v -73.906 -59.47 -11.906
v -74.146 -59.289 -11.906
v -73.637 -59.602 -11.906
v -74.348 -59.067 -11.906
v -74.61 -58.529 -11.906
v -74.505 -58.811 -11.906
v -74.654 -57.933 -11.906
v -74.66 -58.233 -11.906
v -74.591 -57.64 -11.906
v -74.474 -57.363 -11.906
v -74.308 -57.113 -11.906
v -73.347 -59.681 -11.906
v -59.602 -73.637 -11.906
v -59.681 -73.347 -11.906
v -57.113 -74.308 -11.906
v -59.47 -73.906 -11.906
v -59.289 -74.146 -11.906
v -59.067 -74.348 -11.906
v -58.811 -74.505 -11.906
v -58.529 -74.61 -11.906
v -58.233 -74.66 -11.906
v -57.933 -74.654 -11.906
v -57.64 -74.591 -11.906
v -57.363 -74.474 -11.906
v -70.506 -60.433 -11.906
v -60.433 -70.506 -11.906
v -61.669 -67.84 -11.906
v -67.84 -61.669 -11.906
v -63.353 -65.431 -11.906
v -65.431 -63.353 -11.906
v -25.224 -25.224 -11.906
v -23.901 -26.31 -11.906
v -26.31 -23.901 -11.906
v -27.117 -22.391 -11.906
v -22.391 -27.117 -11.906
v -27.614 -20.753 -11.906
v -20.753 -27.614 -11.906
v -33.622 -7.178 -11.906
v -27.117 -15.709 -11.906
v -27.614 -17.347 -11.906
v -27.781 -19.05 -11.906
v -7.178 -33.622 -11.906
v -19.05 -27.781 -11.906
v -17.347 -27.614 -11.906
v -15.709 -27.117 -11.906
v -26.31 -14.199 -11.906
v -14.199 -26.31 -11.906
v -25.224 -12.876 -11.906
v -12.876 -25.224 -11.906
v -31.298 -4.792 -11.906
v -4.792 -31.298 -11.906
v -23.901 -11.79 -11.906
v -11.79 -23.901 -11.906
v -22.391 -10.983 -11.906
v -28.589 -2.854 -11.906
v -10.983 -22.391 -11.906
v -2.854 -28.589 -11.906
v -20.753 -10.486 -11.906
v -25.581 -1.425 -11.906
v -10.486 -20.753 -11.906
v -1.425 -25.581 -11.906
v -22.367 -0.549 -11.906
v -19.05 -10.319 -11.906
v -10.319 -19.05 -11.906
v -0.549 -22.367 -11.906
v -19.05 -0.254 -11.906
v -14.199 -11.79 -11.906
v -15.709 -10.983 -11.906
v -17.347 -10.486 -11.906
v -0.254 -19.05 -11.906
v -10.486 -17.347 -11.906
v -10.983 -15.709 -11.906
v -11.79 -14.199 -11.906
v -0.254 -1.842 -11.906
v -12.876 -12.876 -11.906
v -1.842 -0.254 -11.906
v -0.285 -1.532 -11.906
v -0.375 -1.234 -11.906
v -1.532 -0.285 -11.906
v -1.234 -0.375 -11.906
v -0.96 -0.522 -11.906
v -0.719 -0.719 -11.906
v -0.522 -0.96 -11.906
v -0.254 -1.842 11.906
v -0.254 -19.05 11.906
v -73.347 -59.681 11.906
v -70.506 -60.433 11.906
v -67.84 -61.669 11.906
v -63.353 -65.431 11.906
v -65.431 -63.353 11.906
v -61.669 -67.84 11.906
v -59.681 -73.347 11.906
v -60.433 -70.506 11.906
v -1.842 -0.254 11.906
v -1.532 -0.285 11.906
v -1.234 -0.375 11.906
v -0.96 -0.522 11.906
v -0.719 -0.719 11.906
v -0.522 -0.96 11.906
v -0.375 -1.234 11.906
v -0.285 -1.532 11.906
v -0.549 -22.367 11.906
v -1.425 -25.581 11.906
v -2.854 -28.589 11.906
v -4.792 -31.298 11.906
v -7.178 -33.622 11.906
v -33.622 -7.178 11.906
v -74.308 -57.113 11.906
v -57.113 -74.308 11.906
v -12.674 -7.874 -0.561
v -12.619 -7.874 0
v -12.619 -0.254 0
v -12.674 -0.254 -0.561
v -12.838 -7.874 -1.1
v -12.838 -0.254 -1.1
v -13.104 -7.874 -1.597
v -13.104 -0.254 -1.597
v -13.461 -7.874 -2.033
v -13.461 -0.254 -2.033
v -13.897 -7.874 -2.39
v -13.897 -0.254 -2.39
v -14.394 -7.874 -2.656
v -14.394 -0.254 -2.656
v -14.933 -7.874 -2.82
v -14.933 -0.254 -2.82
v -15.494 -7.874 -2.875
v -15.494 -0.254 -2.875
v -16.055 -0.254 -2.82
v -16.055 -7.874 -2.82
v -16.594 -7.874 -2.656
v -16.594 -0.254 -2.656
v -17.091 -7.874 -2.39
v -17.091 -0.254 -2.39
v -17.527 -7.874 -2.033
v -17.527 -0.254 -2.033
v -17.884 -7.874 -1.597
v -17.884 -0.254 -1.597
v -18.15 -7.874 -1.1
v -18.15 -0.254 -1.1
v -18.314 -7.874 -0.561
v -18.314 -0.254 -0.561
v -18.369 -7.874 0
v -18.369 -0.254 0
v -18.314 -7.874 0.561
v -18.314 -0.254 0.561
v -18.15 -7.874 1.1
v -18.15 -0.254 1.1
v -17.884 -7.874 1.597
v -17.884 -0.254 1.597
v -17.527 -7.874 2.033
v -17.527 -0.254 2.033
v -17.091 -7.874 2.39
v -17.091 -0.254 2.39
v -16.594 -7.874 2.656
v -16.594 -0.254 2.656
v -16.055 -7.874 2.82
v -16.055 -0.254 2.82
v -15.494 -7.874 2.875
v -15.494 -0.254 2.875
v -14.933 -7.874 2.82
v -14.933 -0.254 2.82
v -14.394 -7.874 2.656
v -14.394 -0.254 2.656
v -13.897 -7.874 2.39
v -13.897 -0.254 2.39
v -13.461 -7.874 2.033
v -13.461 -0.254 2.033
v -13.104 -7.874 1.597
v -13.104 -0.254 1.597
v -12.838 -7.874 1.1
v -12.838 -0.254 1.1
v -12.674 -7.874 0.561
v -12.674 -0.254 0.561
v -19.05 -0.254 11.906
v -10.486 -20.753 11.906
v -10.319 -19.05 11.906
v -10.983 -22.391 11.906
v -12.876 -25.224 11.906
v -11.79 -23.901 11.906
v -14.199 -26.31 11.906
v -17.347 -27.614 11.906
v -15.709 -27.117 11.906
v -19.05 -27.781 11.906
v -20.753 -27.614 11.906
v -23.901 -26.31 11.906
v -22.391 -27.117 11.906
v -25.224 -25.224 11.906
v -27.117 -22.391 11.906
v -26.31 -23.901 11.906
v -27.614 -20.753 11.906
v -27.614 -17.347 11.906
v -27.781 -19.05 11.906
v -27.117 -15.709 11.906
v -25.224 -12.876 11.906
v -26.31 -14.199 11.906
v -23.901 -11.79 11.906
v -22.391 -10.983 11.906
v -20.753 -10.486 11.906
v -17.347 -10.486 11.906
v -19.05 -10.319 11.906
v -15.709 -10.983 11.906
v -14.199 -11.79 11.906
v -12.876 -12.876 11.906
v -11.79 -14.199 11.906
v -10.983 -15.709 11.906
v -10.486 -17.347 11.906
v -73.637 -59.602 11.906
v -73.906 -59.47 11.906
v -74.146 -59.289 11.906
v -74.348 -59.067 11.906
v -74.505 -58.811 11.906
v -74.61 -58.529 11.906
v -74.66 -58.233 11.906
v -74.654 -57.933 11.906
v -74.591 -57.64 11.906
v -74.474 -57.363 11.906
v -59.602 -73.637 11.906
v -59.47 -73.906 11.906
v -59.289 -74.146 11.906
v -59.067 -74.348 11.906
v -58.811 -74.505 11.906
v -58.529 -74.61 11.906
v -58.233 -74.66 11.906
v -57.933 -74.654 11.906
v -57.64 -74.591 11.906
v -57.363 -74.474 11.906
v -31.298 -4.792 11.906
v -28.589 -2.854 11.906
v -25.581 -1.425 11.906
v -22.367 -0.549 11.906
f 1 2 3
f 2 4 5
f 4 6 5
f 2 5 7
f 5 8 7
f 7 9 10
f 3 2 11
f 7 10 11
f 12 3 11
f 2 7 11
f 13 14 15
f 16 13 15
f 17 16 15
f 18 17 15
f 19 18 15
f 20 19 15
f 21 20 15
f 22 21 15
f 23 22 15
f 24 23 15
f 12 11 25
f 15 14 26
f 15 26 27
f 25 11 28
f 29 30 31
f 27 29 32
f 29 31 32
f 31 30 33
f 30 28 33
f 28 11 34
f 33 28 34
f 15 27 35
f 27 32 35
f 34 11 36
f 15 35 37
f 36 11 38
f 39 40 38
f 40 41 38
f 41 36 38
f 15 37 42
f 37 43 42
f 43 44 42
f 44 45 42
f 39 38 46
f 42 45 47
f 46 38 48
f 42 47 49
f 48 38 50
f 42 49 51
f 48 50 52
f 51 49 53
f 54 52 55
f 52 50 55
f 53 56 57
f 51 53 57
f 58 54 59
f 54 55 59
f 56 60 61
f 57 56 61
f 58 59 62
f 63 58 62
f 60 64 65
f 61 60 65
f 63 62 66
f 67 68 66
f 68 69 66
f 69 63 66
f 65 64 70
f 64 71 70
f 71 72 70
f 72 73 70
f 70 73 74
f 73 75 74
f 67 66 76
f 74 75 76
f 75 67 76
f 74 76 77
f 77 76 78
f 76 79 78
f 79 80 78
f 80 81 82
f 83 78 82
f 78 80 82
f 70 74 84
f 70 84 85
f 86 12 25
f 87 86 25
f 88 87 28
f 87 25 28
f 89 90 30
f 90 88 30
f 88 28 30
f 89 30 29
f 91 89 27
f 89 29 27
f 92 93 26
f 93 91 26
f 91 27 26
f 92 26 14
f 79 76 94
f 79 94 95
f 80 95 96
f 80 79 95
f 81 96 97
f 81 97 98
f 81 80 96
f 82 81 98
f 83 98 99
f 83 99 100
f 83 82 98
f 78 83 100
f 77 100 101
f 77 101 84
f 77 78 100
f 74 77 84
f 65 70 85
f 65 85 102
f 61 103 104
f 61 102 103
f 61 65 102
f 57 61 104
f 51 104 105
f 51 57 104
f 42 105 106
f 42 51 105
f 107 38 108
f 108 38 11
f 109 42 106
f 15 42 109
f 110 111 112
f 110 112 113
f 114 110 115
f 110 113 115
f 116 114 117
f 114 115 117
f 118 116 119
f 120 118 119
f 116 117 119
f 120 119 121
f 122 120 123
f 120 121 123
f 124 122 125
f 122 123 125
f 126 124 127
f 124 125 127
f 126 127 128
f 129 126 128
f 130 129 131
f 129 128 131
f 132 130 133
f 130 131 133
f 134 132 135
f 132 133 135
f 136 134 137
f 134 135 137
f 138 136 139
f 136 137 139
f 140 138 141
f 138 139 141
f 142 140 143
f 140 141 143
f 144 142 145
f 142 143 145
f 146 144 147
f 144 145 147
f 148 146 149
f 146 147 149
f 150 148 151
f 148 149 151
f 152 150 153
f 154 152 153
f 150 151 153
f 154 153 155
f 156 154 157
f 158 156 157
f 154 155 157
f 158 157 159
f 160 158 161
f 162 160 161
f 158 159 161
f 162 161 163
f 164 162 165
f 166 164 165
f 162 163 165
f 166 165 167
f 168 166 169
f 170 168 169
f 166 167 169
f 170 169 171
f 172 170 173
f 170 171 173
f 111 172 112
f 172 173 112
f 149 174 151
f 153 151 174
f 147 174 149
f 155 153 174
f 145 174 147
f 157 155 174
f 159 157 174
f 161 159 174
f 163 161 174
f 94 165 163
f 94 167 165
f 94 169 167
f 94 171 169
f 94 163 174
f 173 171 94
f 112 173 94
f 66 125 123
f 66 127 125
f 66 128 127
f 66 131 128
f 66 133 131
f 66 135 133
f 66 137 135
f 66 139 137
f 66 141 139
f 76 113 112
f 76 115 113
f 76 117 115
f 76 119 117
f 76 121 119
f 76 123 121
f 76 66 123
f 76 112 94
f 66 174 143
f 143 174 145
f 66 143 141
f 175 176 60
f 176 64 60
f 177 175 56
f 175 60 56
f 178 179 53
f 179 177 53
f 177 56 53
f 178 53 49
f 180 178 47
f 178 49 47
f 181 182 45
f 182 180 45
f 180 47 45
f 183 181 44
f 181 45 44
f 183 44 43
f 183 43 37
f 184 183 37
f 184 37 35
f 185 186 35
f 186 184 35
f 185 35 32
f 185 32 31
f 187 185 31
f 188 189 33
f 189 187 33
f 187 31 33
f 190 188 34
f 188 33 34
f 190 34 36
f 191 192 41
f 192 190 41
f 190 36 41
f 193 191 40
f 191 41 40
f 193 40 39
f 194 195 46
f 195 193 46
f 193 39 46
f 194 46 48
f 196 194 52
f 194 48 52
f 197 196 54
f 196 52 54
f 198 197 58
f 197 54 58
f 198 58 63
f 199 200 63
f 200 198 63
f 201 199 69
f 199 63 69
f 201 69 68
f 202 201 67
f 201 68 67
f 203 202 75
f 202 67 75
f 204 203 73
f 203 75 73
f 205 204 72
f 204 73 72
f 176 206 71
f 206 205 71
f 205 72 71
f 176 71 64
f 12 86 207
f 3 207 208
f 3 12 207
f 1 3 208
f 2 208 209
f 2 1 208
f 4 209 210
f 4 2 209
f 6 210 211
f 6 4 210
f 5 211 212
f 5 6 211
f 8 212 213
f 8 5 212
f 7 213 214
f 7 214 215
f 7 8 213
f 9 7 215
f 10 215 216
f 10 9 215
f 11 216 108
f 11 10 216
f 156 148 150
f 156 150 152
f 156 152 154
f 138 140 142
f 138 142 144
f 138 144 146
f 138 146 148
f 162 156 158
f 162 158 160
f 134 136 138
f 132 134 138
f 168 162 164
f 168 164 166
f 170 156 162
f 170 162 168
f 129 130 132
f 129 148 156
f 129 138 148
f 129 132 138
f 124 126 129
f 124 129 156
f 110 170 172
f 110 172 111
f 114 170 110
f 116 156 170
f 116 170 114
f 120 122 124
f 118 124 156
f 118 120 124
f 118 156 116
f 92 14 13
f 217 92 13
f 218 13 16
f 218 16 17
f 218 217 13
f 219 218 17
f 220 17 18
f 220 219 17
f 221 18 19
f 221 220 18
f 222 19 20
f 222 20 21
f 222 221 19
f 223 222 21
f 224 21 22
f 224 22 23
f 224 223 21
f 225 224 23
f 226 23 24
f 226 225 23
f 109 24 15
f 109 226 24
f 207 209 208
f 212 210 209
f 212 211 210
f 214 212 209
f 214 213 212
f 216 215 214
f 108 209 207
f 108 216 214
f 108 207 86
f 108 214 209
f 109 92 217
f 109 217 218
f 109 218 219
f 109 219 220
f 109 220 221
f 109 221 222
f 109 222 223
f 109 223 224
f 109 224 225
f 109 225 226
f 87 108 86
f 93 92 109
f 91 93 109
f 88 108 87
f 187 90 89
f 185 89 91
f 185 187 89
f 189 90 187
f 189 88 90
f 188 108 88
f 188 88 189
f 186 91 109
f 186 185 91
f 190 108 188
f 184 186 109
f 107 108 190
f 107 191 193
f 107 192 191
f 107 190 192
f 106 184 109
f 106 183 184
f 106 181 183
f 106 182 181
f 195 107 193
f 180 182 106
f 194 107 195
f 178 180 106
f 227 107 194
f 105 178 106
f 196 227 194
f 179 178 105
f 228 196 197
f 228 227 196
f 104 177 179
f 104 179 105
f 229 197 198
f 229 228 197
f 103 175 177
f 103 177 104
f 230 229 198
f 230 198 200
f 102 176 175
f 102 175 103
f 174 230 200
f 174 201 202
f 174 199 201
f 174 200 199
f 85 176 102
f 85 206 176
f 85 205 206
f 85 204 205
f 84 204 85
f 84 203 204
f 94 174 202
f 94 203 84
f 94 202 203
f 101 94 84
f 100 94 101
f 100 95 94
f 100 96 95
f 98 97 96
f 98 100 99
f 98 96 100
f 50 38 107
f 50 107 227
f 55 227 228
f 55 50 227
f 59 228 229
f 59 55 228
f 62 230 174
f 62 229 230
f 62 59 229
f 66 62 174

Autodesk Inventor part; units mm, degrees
ref_plane "YZ Plane" through (0, 0, 0) normal (1, 0, 0) x (0, 1, 0)
ref_plane "XZ Plane" through (0, 0, 0) normal (0, 1, 0) x (-1, 0, 0)
sketch "Sketch1" plane through (0, 0, 0) normal (0, 0, 1) x (1, 0, 0)
  line L0 (-76.2, 76.2) -> (76.2, 76.2) construction
  line L1 (76.2, 76.2) -> (76.2, -76.2) construction
  line L2 (76.2, -76.2) -> (-76.2, -76.2) construction
  line L3 (-76.2, -76.2) -> (-76.2, 76.2) construction
  line L4 (-76.2, 76.2) -> (76.2, -76.2) construction
  line L5 (76.2, 76.2) -> (-76.2, -76.2) construction
  circle A0 centre (-76.2, -76.2) radius 16.764 construction
  circle A1 centre (76.2, -76.2) radius 16.764 construction
  circle A2 centre (-19.05, -19.05) radius 8.7313
  circle A3 centre (19.05, -19.05) radius 8.7313 construction
  line L6 (-19.05, -19.05) -> (19.05, -19.05) construction
  circle A4 centre (-19.05, -19.05) radius 19.05 construction
  circle A5 centre (19.05, -19.05) radius 19.05 construction
  circle A6 centre (-19.05, -19.05) radius 18.796 construction
  circle A7 centre (19.05, -19.05) radius 18.796 construction
  arc A8 (-59.436, -76.2) -> (-76.2, -59.436) centre (-76.2, -76.2) ccw
  line L7 (-19.05, 0) -> (-3.4943, 0)
  line L8 (-33.6217, -7.1775) -> (-76.2, -59.436)
  line L9 (-7.1775, -33.6217) -> (-59.436, -76.2)
  line L10 (-19.05, -0.254) -> (-0.254, -0.254)
  line L11 (-0.254, -0.254) -> (-0.254, -19.05)
  arc A9 (-19.05, -0.254) -> (-33.6217, -7.1775) centre (-19.05, -19.05) ccw
  arc A10 (-7.1775, -33.6217) -> (-0.254, -19.05) centre (-19.05, -19.05) ccw
  point P0 (0, 0)
  point P1 (-33.1106, -7.4056)
  dimension "d0" = 152.4
  dimension "d1" = 152.4
  dimension "d2" = 33.528
  dimension "d3" = 17.4625
  dimension "d4" = 38.1
  dimension "d7" = 0.254
  dimension "d8" = 0.254
extrude "Extrusion1" add sketch "Sketch1" along normal mid plane 23.8125
fillet "Fillet1" radius 1.5875 3 edges at (-0.254, -0.254, 0) (-76.2, -59.436, 0) (-59.436, -76.2, 0)
sketch "Sketch2" plane through (0, 0, 11.9062) normal (0, 0, 1) x (1, 0, 0)
  circle A0 centre (-19.05, -19.05) radius 8.7312 projected
  circle A1 centre (-19.05, -19.05) radius 14.2875
  point P0 (0, 0)
  dimension "d12" = 28.575
extrude "Extrusion2" [suppressed]
mirror "Mirror1" [suppressed]
sketch "Sketch3" plane through (0, 0, 11.9062) normal (0, 0, 1) x (1, 0, 0)
  arc A0 (-59.6805, -73.3471) -> (-57.1134, -74.3077) centre (-58.1162, -73.077) ccw construction
  line L0 (-57.1134, -74.3077) -> (-7.1775, -33.6217) construction
  arc A1 (-7.1775, -33.6217) -> (-0.254, -19.05) centre (-19.05, -19.05) ccw construction
  line L1 (-0.254, -19.05) -> (-0.254, -1.8415) construction
  arc A2 (-0.254, -1.8415) -> (-1.8415, -0.254) centre (-1.8415, -1.8415) ccw construction
  line L2 (-1.8415, -0.254) -> (-19.05, -0.254) construction
  arc A3 (-19.05, -0.254) -> (-33.6217, -7.1775) centre (-19.05, -19.05) ccw construction
  line L3 (-33.6217, -7.1775) -> (-74.3077, -57.1134) construction
  arc A4 (-74.3077, -57.1134) -> (-73.3471, -59.6805) centre (-73.077, -58.1162) ccw construction
  arc A5 (-59.6805, -73.3471) -> (-73.3471, -59.6805) centre (-76.2, -76.2) ccw construction
  line L4 (19.05, 0) -> (-21.3612, -40.4112) construction
  line L5 (19.05, 0) -> (-21.3612, 40.4112) construction
  line L6 (19.05, 0) -> (0, 0) construction
  point P0 (-6.35, 0)
  dimension "d15" = 6.096
  dimension "d17" = 25.4
  dimension "d18" = 57.15
  dimension "d19" = 57.15
  dimension "d20" = 45
ref_plane "Work Plane1" through (-0.719, -0.719, -11.9062) normal (-0.7071, -0.7071, 0) x (0.7071, -0.7071, 0)
sketch "Sketch5" plane through (-19.05, -0.254, 11.9062) normal (0, 1, 0) x (1, 0, 0)
  line L0 (18.796, 0) -> (18.796, 23.8125) construction
  line L1 (-14.5717, 0) -> (-14.5717, 23.8125) construction
  circle A0 centre (3.556, 11.9062) radius 2.875
  point P0 (19.05, 11.9062)
  point P1 (-14.5717, 11.9062)
  dimension "d28" = 15.24
  dimension "d29" = 5.75
extrude "Extrusion3" cut sketch "Sketch5" against normal blind 7.62
equation "\"d7\" = d8"
equation "\"d19\" = d18"
properties part number "CL7-004" material "ABS Plastic"
